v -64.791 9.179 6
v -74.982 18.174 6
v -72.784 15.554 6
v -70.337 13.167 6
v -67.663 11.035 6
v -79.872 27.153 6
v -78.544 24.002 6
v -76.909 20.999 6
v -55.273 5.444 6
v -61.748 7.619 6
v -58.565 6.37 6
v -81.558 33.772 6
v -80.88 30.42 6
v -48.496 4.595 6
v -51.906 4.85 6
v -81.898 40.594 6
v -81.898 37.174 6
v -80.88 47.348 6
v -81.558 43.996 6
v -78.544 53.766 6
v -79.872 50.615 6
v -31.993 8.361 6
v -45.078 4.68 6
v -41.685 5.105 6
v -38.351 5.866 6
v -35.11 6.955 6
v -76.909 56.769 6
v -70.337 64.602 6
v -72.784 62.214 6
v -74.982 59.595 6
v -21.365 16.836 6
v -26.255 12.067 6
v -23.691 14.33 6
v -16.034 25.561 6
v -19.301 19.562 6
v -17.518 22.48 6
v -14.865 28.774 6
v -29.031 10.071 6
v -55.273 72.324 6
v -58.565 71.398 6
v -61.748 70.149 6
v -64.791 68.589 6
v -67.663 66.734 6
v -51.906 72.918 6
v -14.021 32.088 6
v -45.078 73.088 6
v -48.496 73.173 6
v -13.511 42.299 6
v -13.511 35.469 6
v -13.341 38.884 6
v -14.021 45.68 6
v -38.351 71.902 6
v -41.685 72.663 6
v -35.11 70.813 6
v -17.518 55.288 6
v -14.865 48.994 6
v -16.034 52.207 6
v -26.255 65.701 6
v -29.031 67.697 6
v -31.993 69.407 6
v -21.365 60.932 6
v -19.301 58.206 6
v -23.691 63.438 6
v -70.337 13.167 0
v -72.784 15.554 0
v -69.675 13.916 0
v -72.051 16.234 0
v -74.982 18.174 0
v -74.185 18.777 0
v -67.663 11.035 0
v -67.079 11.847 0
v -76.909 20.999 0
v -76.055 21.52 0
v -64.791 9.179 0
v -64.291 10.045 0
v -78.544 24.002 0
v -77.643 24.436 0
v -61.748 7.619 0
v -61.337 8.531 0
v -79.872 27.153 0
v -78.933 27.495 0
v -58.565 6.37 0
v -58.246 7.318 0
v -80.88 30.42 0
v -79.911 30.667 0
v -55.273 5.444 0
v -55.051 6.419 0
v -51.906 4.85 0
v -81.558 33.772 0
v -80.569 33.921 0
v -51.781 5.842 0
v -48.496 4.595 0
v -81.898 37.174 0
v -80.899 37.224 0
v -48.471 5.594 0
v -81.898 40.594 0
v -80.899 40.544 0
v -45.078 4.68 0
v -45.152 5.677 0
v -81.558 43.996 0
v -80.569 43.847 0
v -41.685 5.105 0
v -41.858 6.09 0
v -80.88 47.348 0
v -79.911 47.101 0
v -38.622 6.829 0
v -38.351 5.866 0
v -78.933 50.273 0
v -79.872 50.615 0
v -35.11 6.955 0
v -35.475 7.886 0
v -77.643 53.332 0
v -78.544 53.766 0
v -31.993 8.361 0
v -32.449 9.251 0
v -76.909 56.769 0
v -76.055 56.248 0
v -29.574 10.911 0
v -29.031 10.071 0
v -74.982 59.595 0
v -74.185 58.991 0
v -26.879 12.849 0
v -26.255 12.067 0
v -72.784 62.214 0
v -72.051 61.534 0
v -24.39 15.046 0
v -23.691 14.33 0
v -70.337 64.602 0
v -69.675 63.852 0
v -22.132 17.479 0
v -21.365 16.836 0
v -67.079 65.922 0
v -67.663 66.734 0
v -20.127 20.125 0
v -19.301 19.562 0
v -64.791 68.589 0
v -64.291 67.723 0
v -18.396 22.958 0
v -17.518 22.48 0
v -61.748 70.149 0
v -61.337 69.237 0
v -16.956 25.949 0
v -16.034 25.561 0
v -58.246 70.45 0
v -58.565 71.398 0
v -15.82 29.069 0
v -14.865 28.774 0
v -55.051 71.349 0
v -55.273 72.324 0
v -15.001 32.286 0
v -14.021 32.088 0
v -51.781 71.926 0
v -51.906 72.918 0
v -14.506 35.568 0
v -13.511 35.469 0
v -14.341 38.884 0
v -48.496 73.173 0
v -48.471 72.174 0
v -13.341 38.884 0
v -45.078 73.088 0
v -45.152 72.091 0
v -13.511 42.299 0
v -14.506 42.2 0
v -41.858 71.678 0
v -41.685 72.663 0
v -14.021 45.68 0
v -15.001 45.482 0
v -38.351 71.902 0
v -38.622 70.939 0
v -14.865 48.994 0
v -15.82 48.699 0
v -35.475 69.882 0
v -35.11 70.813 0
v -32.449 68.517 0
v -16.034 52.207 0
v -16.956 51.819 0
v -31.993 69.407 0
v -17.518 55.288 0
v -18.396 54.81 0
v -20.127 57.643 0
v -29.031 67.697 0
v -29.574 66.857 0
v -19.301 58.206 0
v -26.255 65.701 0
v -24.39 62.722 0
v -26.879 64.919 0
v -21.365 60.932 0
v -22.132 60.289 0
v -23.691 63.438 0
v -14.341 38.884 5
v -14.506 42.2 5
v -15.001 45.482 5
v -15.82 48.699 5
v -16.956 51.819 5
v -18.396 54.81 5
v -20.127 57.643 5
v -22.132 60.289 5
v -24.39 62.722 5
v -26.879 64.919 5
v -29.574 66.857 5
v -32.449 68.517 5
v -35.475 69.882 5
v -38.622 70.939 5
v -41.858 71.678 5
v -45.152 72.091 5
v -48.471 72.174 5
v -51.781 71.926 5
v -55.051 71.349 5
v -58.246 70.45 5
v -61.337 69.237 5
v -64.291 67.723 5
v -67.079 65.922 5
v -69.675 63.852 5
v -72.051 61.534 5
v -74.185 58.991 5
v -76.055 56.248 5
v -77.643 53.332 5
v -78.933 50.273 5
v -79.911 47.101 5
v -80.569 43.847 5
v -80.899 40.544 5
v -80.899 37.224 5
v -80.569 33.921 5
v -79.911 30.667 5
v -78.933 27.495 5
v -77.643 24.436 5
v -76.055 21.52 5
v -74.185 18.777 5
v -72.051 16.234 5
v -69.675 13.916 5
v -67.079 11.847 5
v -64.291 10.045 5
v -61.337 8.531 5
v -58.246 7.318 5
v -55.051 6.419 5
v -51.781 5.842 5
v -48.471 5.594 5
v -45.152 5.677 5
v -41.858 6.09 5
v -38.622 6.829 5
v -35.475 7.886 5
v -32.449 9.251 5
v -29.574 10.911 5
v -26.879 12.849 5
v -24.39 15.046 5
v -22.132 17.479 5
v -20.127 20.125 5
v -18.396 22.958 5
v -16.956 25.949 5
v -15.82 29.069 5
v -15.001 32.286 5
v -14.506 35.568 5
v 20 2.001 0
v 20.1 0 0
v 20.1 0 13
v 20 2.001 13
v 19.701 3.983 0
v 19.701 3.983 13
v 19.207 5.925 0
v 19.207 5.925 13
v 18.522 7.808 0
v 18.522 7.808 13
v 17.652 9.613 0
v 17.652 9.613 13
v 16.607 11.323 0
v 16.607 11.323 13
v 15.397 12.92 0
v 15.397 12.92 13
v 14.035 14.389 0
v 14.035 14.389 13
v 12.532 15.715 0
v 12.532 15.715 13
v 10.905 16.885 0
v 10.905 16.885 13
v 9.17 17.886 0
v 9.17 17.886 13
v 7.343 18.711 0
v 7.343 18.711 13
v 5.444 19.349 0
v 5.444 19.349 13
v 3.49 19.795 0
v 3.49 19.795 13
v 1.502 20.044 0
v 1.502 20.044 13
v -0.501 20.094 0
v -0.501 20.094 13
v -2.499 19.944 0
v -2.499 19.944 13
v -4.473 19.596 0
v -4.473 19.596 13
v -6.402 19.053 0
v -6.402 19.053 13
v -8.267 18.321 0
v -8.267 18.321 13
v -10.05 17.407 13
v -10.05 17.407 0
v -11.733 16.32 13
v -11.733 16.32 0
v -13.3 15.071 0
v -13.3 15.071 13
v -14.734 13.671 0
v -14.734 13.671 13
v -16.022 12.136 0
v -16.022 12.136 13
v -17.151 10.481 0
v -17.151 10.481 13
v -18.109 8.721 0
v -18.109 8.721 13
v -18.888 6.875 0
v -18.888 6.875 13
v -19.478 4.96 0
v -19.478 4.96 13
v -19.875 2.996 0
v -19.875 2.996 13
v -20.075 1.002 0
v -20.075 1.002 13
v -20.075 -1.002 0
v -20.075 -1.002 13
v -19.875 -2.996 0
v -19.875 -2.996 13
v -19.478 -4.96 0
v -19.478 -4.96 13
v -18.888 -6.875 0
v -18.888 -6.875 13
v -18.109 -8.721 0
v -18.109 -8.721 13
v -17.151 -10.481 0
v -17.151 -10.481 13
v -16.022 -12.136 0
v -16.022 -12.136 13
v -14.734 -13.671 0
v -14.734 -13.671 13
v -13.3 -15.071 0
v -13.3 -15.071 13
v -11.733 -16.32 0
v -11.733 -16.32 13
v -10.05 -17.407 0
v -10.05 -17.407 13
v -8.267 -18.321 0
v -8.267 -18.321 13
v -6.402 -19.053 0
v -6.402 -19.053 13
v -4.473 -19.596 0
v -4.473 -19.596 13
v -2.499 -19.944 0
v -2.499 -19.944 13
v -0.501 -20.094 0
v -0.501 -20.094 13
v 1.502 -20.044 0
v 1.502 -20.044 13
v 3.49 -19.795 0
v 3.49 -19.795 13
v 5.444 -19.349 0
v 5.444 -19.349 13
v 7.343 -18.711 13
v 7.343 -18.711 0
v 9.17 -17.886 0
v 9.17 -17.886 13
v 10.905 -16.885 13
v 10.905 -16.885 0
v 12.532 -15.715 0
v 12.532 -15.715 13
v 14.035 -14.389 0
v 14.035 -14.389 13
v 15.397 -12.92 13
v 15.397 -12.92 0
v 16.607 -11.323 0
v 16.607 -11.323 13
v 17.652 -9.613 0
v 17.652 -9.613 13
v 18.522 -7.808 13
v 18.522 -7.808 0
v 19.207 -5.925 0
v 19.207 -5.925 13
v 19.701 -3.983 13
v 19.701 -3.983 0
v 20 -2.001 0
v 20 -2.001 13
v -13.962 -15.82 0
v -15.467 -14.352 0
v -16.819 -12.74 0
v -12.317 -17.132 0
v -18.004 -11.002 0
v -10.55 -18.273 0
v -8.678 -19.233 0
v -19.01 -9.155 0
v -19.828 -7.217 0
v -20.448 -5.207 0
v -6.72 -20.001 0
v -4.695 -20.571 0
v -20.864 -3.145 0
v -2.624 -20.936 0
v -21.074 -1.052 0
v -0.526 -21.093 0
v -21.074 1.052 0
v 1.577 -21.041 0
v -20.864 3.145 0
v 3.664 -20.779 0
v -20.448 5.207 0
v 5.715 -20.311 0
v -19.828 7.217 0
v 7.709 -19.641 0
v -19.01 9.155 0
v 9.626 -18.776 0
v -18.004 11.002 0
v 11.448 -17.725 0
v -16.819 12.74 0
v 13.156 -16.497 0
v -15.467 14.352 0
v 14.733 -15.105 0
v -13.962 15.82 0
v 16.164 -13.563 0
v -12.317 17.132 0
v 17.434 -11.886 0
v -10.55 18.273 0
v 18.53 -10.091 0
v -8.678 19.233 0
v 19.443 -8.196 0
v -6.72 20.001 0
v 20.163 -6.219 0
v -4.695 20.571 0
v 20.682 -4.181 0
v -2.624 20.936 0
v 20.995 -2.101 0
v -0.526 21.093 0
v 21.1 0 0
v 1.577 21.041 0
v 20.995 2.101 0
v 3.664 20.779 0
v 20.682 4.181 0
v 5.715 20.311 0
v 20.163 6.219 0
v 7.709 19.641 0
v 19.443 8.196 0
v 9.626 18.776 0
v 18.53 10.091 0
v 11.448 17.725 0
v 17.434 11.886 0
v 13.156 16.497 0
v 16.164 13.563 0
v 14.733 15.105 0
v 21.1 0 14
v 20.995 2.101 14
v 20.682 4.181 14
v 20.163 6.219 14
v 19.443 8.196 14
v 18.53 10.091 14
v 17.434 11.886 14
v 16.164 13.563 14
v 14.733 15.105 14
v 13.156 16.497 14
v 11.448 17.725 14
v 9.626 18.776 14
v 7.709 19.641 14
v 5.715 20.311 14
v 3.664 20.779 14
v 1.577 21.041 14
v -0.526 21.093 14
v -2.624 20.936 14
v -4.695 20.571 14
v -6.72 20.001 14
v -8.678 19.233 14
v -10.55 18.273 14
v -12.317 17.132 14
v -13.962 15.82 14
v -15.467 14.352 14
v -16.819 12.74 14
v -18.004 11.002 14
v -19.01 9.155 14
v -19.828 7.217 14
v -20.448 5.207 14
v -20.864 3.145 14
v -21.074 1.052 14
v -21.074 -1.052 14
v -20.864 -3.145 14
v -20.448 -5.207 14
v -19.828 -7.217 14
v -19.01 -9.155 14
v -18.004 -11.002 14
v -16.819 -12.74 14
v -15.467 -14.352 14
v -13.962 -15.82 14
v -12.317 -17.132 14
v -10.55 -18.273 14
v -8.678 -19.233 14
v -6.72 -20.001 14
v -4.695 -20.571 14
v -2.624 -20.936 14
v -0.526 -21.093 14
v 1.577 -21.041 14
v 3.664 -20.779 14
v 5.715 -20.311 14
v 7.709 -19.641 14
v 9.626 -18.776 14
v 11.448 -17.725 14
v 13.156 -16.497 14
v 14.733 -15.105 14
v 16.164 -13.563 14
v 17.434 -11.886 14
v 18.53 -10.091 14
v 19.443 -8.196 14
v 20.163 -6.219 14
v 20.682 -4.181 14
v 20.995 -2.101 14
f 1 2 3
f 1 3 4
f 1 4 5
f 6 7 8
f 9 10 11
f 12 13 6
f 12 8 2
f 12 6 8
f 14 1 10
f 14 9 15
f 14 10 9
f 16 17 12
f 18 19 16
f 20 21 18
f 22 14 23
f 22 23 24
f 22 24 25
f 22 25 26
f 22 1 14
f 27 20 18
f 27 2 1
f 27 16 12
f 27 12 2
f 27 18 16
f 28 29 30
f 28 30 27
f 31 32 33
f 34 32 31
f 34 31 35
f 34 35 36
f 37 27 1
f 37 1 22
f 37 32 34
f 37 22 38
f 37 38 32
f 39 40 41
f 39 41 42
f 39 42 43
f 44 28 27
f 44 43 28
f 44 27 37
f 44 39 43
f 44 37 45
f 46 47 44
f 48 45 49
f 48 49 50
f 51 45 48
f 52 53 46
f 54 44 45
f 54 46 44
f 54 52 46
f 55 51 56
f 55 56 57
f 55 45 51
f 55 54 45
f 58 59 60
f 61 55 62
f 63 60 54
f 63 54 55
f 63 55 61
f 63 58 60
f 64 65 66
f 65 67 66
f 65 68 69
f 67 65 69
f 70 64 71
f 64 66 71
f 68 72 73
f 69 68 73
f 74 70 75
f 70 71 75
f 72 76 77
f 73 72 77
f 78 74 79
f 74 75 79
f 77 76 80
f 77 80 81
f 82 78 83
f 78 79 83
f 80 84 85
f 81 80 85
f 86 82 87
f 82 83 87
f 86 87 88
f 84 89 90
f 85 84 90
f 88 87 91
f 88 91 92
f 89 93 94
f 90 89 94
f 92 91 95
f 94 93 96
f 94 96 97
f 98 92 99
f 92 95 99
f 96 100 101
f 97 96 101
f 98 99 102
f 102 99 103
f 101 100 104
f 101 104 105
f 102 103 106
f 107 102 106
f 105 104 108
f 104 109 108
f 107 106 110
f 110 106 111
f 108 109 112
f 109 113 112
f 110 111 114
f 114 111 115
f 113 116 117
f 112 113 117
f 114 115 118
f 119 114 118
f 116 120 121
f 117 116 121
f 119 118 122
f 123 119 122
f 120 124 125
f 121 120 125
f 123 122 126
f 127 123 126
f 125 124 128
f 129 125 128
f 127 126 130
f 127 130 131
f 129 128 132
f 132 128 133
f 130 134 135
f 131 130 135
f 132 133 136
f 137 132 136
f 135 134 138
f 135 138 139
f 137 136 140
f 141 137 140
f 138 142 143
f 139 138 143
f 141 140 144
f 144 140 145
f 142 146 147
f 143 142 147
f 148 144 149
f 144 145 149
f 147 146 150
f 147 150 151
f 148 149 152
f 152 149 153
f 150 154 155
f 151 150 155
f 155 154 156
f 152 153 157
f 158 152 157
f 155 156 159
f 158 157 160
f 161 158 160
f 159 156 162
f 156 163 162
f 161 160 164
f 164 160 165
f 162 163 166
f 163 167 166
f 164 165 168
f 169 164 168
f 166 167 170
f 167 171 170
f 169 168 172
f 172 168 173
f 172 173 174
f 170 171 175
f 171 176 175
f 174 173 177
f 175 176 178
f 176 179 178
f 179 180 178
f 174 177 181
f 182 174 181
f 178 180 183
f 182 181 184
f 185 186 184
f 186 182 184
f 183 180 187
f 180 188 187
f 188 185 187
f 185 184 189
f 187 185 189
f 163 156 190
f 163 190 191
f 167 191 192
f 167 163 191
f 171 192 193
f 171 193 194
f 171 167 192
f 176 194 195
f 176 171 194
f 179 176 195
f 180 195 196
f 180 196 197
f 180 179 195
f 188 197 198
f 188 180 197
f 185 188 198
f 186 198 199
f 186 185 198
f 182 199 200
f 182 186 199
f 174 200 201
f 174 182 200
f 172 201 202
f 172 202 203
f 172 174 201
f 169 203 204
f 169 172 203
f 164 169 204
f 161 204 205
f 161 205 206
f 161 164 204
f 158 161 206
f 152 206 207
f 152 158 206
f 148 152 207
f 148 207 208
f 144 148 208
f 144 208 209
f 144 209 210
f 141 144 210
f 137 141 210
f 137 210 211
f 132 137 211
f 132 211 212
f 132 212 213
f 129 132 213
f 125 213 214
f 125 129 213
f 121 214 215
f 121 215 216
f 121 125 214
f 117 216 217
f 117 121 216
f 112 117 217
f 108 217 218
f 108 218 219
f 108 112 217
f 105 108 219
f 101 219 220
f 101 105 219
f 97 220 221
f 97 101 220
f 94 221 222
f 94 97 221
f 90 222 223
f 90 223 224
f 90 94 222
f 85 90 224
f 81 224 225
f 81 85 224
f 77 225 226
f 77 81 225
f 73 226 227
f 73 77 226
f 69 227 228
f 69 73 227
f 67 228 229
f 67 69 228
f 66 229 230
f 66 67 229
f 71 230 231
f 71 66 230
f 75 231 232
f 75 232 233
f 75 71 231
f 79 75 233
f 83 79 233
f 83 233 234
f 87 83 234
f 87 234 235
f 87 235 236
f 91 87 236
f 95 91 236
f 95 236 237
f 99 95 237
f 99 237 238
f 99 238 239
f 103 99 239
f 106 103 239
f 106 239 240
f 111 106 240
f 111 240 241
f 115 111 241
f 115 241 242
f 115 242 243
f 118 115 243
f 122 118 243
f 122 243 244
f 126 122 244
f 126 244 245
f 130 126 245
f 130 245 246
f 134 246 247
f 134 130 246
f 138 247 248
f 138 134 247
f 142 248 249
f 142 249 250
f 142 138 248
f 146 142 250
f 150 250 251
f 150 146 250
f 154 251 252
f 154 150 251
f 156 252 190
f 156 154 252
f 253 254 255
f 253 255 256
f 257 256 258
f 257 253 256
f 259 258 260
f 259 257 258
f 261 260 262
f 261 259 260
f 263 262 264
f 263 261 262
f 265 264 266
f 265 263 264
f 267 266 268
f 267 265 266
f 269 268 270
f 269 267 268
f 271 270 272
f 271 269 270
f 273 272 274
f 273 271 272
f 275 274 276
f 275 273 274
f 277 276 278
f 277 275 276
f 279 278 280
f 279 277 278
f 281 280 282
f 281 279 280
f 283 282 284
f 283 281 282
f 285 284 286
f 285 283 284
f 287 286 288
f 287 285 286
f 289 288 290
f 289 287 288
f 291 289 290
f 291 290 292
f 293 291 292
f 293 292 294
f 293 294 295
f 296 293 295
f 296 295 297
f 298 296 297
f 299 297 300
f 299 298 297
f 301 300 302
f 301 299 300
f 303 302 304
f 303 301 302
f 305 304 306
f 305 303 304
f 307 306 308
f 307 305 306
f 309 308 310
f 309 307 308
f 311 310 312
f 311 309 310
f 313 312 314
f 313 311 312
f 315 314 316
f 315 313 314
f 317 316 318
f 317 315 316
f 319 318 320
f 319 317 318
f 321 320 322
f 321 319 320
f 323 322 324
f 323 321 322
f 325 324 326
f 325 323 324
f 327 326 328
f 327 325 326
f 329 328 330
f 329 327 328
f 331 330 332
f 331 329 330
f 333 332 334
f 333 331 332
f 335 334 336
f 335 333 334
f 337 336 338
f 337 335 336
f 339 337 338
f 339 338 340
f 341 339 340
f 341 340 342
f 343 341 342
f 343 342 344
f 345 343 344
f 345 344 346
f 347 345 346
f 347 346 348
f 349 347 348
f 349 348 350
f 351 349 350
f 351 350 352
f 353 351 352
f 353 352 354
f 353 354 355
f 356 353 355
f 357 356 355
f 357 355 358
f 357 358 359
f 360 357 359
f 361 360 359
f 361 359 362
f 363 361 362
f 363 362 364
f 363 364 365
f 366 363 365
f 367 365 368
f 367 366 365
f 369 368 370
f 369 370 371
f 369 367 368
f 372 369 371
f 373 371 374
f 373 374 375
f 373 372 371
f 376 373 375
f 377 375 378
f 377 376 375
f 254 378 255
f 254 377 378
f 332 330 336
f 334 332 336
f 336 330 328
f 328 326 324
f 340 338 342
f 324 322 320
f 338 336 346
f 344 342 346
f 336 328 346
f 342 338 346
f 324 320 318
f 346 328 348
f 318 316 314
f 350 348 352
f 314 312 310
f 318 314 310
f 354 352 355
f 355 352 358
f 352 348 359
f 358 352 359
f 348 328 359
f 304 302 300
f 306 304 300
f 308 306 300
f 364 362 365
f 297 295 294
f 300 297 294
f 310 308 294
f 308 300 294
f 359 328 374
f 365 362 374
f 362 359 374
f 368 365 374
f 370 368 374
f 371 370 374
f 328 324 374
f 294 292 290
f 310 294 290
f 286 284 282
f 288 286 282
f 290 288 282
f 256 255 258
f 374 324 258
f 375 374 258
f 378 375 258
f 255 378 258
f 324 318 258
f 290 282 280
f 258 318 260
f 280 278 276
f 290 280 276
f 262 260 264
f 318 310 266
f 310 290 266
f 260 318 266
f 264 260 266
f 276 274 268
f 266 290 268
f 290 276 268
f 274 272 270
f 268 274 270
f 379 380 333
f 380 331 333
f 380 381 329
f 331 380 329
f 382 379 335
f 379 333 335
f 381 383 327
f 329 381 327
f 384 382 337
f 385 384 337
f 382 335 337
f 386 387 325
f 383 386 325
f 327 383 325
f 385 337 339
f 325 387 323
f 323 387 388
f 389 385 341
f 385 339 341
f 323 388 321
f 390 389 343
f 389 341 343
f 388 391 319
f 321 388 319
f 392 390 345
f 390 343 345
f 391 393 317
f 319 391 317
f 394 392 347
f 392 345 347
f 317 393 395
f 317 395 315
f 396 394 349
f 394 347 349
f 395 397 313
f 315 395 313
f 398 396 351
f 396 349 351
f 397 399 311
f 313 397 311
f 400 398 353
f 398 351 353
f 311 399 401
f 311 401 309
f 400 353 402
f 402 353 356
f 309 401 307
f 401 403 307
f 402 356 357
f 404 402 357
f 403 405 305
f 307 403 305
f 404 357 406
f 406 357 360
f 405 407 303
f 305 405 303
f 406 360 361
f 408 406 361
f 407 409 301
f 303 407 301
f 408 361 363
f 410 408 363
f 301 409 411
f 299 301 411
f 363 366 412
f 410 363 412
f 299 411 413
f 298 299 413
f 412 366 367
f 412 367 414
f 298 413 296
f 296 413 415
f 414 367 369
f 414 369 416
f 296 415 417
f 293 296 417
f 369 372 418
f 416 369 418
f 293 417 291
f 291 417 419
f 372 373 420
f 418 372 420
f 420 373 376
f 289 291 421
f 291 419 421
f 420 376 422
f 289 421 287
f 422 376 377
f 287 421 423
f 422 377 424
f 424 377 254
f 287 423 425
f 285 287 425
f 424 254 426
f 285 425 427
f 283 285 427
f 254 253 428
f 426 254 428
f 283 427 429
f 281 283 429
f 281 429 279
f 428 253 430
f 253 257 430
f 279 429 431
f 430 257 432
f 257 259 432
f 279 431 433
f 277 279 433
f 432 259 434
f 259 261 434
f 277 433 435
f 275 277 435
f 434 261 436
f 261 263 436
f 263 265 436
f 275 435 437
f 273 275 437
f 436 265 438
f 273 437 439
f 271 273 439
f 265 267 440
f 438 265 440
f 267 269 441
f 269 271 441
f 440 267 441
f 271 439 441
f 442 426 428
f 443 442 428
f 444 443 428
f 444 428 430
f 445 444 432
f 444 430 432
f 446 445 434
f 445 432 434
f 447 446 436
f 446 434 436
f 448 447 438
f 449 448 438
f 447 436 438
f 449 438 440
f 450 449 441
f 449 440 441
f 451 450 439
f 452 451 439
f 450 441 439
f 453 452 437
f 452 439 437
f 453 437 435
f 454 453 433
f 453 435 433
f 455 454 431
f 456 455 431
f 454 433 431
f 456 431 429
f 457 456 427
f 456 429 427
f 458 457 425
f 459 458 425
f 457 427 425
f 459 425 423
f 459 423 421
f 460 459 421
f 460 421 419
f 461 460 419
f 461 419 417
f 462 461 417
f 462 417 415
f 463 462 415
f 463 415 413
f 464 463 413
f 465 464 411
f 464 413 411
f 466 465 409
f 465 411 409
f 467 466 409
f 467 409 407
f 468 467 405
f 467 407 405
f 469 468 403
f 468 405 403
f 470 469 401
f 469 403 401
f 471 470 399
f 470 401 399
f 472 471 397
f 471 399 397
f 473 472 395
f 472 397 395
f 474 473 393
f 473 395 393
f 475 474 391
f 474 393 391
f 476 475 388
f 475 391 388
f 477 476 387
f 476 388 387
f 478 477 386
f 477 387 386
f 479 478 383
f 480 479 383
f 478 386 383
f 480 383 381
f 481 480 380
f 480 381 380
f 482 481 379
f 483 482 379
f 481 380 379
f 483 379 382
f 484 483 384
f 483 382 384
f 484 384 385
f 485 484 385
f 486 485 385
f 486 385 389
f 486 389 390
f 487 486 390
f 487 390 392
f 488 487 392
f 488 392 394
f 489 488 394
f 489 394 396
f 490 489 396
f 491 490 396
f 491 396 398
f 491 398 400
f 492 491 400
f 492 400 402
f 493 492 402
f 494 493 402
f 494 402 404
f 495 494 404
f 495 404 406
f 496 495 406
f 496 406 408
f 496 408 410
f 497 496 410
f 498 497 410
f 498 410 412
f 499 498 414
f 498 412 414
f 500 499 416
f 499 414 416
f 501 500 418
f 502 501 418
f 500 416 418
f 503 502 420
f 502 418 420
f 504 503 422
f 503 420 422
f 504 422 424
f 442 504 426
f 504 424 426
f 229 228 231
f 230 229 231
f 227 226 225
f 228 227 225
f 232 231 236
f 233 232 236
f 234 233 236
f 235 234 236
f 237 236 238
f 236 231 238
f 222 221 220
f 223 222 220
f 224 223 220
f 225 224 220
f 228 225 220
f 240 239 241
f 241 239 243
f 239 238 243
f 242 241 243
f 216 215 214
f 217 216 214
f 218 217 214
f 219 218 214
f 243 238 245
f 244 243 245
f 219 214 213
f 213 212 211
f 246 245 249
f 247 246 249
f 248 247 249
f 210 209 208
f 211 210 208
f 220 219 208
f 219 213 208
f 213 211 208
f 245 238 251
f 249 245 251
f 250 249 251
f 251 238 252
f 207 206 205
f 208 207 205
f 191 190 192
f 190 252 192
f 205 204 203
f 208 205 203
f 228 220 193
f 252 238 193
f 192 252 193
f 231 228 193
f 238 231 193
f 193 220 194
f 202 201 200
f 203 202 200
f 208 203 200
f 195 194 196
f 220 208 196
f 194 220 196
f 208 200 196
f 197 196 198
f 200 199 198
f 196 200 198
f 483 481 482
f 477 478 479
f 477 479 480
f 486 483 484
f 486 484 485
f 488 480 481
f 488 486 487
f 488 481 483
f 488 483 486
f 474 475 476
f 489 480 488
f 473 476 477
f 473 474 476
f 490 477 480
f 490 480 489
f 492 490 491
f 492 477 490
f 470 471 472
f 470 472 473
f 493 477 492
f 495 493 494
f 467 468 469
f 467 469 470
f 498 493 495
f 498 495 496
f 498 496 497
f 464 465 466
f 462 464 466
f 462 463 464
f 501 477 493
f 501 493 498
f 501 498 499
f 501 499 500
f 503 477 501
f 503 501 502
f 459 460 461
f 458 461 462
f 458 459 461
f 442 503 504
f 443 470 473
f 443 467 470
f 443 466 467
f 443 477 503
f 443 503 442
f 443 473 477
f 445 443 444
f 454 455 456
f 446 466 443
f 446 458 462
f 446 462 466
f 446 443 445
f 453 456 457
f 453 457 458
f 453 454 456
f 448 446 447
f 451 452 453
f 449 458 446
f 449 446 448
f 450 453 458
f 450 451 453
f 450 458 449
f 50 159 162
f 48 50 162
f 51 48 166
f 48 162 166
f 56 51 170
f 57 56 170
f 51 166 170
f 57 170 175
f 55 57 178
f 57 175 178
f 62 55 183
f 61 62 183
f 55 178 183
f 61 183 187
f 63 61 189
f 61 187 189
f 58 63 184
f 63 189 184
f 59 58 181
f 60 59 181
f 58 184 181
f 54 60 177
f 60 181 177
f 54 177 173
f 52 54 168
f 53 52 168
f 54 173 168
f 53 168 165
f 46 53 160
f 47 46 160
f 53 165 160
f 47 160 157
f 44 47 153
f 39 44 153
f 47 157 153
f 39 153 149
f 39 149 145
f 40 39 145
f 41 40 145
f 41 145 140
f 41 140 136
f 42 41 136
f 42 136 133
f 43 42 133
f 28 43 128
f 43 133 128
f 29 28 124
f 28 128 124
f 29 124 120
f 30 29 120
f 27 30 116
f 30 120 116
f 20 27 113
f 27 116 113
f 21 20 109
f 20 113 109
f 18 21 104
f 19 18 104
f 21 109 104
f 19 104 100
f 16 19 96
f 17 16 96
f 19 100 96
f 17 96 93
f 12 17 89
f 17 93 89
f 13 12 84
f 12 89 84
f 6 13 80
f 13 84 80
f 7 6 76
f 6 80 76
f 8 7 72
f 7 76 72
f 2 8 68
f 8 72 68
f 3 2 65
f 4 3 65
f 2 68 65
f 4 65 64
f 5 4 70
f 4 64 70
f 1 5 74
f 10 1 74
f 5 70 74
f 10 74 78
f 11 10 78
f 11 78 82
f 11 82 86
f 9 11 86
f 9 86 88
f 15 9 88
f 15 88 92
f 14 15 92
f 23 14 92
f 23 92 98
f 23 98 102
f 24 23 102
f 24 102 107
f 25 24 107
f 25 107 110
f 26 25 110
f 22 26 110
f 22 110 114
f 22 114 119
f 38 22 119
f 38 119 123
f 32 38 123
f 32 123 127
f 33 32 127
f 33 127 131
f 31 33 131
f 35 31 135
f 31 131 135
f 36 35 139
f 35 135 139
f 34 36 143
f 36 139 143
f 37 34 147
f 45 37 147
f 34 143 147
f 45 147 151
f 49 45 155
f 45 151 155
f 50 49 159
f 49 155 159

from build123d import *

# Parameters (mm, degrees)
F2_R     = 21.1
F2_R_2   = 20.1
F3_DEPTH = 14
F4_DEPTH = 13
F2_R_3   = 34.3
F2_R_4   = 33.3
F5_DEPTH = 6
F6_DEPTH = 5


with BuildPart() as f3:
    # F2 (on Top) → F3 (new body)
    with BuildSketch(Plane.XY):
        Circle(F2_R)
        Circle(F2_R_2, mode=Mode.SUBTRACT)
        Circle(F2_R_2)
    extrude(amount=F3_DEPTH)

    # F2 (on Top) → F4 (cut)
    with BuildSketch(Plane.XY):
        Circle(F2_R_2)
    extrude(amount=F4_DEPTH, mode=Mode.SUBTRACT)


with BuildPart() as f5:
    # F2 (on Top) → F5 (new body)
    with BuildSketch(Plane.XY):
        with Locations((-47.6407893002, 38.8840572437)):
            Circle(F2_R_3)
        with Locations((-47.6407893002, 38.8840572437)):
            Circle(F2_R_4, mode=Mode.SUBTRACT)
        with Locations((-47.6407893002, 38.8840572437)):
            Circle(F2_R_4)
    extrude(amount=F5_DEPTH)

    # F2 (on Top) → F6 (cut)
    with BuildSketch(Plane.XY):
        with Locations((-47.6407893002, 38.8840572437)):
            Circle(F2_R_4)
    extrude(amount=F6_DEPTH, mode=Mode.SUBTRACT)


solid = Compound([f3.part, f5.part])
